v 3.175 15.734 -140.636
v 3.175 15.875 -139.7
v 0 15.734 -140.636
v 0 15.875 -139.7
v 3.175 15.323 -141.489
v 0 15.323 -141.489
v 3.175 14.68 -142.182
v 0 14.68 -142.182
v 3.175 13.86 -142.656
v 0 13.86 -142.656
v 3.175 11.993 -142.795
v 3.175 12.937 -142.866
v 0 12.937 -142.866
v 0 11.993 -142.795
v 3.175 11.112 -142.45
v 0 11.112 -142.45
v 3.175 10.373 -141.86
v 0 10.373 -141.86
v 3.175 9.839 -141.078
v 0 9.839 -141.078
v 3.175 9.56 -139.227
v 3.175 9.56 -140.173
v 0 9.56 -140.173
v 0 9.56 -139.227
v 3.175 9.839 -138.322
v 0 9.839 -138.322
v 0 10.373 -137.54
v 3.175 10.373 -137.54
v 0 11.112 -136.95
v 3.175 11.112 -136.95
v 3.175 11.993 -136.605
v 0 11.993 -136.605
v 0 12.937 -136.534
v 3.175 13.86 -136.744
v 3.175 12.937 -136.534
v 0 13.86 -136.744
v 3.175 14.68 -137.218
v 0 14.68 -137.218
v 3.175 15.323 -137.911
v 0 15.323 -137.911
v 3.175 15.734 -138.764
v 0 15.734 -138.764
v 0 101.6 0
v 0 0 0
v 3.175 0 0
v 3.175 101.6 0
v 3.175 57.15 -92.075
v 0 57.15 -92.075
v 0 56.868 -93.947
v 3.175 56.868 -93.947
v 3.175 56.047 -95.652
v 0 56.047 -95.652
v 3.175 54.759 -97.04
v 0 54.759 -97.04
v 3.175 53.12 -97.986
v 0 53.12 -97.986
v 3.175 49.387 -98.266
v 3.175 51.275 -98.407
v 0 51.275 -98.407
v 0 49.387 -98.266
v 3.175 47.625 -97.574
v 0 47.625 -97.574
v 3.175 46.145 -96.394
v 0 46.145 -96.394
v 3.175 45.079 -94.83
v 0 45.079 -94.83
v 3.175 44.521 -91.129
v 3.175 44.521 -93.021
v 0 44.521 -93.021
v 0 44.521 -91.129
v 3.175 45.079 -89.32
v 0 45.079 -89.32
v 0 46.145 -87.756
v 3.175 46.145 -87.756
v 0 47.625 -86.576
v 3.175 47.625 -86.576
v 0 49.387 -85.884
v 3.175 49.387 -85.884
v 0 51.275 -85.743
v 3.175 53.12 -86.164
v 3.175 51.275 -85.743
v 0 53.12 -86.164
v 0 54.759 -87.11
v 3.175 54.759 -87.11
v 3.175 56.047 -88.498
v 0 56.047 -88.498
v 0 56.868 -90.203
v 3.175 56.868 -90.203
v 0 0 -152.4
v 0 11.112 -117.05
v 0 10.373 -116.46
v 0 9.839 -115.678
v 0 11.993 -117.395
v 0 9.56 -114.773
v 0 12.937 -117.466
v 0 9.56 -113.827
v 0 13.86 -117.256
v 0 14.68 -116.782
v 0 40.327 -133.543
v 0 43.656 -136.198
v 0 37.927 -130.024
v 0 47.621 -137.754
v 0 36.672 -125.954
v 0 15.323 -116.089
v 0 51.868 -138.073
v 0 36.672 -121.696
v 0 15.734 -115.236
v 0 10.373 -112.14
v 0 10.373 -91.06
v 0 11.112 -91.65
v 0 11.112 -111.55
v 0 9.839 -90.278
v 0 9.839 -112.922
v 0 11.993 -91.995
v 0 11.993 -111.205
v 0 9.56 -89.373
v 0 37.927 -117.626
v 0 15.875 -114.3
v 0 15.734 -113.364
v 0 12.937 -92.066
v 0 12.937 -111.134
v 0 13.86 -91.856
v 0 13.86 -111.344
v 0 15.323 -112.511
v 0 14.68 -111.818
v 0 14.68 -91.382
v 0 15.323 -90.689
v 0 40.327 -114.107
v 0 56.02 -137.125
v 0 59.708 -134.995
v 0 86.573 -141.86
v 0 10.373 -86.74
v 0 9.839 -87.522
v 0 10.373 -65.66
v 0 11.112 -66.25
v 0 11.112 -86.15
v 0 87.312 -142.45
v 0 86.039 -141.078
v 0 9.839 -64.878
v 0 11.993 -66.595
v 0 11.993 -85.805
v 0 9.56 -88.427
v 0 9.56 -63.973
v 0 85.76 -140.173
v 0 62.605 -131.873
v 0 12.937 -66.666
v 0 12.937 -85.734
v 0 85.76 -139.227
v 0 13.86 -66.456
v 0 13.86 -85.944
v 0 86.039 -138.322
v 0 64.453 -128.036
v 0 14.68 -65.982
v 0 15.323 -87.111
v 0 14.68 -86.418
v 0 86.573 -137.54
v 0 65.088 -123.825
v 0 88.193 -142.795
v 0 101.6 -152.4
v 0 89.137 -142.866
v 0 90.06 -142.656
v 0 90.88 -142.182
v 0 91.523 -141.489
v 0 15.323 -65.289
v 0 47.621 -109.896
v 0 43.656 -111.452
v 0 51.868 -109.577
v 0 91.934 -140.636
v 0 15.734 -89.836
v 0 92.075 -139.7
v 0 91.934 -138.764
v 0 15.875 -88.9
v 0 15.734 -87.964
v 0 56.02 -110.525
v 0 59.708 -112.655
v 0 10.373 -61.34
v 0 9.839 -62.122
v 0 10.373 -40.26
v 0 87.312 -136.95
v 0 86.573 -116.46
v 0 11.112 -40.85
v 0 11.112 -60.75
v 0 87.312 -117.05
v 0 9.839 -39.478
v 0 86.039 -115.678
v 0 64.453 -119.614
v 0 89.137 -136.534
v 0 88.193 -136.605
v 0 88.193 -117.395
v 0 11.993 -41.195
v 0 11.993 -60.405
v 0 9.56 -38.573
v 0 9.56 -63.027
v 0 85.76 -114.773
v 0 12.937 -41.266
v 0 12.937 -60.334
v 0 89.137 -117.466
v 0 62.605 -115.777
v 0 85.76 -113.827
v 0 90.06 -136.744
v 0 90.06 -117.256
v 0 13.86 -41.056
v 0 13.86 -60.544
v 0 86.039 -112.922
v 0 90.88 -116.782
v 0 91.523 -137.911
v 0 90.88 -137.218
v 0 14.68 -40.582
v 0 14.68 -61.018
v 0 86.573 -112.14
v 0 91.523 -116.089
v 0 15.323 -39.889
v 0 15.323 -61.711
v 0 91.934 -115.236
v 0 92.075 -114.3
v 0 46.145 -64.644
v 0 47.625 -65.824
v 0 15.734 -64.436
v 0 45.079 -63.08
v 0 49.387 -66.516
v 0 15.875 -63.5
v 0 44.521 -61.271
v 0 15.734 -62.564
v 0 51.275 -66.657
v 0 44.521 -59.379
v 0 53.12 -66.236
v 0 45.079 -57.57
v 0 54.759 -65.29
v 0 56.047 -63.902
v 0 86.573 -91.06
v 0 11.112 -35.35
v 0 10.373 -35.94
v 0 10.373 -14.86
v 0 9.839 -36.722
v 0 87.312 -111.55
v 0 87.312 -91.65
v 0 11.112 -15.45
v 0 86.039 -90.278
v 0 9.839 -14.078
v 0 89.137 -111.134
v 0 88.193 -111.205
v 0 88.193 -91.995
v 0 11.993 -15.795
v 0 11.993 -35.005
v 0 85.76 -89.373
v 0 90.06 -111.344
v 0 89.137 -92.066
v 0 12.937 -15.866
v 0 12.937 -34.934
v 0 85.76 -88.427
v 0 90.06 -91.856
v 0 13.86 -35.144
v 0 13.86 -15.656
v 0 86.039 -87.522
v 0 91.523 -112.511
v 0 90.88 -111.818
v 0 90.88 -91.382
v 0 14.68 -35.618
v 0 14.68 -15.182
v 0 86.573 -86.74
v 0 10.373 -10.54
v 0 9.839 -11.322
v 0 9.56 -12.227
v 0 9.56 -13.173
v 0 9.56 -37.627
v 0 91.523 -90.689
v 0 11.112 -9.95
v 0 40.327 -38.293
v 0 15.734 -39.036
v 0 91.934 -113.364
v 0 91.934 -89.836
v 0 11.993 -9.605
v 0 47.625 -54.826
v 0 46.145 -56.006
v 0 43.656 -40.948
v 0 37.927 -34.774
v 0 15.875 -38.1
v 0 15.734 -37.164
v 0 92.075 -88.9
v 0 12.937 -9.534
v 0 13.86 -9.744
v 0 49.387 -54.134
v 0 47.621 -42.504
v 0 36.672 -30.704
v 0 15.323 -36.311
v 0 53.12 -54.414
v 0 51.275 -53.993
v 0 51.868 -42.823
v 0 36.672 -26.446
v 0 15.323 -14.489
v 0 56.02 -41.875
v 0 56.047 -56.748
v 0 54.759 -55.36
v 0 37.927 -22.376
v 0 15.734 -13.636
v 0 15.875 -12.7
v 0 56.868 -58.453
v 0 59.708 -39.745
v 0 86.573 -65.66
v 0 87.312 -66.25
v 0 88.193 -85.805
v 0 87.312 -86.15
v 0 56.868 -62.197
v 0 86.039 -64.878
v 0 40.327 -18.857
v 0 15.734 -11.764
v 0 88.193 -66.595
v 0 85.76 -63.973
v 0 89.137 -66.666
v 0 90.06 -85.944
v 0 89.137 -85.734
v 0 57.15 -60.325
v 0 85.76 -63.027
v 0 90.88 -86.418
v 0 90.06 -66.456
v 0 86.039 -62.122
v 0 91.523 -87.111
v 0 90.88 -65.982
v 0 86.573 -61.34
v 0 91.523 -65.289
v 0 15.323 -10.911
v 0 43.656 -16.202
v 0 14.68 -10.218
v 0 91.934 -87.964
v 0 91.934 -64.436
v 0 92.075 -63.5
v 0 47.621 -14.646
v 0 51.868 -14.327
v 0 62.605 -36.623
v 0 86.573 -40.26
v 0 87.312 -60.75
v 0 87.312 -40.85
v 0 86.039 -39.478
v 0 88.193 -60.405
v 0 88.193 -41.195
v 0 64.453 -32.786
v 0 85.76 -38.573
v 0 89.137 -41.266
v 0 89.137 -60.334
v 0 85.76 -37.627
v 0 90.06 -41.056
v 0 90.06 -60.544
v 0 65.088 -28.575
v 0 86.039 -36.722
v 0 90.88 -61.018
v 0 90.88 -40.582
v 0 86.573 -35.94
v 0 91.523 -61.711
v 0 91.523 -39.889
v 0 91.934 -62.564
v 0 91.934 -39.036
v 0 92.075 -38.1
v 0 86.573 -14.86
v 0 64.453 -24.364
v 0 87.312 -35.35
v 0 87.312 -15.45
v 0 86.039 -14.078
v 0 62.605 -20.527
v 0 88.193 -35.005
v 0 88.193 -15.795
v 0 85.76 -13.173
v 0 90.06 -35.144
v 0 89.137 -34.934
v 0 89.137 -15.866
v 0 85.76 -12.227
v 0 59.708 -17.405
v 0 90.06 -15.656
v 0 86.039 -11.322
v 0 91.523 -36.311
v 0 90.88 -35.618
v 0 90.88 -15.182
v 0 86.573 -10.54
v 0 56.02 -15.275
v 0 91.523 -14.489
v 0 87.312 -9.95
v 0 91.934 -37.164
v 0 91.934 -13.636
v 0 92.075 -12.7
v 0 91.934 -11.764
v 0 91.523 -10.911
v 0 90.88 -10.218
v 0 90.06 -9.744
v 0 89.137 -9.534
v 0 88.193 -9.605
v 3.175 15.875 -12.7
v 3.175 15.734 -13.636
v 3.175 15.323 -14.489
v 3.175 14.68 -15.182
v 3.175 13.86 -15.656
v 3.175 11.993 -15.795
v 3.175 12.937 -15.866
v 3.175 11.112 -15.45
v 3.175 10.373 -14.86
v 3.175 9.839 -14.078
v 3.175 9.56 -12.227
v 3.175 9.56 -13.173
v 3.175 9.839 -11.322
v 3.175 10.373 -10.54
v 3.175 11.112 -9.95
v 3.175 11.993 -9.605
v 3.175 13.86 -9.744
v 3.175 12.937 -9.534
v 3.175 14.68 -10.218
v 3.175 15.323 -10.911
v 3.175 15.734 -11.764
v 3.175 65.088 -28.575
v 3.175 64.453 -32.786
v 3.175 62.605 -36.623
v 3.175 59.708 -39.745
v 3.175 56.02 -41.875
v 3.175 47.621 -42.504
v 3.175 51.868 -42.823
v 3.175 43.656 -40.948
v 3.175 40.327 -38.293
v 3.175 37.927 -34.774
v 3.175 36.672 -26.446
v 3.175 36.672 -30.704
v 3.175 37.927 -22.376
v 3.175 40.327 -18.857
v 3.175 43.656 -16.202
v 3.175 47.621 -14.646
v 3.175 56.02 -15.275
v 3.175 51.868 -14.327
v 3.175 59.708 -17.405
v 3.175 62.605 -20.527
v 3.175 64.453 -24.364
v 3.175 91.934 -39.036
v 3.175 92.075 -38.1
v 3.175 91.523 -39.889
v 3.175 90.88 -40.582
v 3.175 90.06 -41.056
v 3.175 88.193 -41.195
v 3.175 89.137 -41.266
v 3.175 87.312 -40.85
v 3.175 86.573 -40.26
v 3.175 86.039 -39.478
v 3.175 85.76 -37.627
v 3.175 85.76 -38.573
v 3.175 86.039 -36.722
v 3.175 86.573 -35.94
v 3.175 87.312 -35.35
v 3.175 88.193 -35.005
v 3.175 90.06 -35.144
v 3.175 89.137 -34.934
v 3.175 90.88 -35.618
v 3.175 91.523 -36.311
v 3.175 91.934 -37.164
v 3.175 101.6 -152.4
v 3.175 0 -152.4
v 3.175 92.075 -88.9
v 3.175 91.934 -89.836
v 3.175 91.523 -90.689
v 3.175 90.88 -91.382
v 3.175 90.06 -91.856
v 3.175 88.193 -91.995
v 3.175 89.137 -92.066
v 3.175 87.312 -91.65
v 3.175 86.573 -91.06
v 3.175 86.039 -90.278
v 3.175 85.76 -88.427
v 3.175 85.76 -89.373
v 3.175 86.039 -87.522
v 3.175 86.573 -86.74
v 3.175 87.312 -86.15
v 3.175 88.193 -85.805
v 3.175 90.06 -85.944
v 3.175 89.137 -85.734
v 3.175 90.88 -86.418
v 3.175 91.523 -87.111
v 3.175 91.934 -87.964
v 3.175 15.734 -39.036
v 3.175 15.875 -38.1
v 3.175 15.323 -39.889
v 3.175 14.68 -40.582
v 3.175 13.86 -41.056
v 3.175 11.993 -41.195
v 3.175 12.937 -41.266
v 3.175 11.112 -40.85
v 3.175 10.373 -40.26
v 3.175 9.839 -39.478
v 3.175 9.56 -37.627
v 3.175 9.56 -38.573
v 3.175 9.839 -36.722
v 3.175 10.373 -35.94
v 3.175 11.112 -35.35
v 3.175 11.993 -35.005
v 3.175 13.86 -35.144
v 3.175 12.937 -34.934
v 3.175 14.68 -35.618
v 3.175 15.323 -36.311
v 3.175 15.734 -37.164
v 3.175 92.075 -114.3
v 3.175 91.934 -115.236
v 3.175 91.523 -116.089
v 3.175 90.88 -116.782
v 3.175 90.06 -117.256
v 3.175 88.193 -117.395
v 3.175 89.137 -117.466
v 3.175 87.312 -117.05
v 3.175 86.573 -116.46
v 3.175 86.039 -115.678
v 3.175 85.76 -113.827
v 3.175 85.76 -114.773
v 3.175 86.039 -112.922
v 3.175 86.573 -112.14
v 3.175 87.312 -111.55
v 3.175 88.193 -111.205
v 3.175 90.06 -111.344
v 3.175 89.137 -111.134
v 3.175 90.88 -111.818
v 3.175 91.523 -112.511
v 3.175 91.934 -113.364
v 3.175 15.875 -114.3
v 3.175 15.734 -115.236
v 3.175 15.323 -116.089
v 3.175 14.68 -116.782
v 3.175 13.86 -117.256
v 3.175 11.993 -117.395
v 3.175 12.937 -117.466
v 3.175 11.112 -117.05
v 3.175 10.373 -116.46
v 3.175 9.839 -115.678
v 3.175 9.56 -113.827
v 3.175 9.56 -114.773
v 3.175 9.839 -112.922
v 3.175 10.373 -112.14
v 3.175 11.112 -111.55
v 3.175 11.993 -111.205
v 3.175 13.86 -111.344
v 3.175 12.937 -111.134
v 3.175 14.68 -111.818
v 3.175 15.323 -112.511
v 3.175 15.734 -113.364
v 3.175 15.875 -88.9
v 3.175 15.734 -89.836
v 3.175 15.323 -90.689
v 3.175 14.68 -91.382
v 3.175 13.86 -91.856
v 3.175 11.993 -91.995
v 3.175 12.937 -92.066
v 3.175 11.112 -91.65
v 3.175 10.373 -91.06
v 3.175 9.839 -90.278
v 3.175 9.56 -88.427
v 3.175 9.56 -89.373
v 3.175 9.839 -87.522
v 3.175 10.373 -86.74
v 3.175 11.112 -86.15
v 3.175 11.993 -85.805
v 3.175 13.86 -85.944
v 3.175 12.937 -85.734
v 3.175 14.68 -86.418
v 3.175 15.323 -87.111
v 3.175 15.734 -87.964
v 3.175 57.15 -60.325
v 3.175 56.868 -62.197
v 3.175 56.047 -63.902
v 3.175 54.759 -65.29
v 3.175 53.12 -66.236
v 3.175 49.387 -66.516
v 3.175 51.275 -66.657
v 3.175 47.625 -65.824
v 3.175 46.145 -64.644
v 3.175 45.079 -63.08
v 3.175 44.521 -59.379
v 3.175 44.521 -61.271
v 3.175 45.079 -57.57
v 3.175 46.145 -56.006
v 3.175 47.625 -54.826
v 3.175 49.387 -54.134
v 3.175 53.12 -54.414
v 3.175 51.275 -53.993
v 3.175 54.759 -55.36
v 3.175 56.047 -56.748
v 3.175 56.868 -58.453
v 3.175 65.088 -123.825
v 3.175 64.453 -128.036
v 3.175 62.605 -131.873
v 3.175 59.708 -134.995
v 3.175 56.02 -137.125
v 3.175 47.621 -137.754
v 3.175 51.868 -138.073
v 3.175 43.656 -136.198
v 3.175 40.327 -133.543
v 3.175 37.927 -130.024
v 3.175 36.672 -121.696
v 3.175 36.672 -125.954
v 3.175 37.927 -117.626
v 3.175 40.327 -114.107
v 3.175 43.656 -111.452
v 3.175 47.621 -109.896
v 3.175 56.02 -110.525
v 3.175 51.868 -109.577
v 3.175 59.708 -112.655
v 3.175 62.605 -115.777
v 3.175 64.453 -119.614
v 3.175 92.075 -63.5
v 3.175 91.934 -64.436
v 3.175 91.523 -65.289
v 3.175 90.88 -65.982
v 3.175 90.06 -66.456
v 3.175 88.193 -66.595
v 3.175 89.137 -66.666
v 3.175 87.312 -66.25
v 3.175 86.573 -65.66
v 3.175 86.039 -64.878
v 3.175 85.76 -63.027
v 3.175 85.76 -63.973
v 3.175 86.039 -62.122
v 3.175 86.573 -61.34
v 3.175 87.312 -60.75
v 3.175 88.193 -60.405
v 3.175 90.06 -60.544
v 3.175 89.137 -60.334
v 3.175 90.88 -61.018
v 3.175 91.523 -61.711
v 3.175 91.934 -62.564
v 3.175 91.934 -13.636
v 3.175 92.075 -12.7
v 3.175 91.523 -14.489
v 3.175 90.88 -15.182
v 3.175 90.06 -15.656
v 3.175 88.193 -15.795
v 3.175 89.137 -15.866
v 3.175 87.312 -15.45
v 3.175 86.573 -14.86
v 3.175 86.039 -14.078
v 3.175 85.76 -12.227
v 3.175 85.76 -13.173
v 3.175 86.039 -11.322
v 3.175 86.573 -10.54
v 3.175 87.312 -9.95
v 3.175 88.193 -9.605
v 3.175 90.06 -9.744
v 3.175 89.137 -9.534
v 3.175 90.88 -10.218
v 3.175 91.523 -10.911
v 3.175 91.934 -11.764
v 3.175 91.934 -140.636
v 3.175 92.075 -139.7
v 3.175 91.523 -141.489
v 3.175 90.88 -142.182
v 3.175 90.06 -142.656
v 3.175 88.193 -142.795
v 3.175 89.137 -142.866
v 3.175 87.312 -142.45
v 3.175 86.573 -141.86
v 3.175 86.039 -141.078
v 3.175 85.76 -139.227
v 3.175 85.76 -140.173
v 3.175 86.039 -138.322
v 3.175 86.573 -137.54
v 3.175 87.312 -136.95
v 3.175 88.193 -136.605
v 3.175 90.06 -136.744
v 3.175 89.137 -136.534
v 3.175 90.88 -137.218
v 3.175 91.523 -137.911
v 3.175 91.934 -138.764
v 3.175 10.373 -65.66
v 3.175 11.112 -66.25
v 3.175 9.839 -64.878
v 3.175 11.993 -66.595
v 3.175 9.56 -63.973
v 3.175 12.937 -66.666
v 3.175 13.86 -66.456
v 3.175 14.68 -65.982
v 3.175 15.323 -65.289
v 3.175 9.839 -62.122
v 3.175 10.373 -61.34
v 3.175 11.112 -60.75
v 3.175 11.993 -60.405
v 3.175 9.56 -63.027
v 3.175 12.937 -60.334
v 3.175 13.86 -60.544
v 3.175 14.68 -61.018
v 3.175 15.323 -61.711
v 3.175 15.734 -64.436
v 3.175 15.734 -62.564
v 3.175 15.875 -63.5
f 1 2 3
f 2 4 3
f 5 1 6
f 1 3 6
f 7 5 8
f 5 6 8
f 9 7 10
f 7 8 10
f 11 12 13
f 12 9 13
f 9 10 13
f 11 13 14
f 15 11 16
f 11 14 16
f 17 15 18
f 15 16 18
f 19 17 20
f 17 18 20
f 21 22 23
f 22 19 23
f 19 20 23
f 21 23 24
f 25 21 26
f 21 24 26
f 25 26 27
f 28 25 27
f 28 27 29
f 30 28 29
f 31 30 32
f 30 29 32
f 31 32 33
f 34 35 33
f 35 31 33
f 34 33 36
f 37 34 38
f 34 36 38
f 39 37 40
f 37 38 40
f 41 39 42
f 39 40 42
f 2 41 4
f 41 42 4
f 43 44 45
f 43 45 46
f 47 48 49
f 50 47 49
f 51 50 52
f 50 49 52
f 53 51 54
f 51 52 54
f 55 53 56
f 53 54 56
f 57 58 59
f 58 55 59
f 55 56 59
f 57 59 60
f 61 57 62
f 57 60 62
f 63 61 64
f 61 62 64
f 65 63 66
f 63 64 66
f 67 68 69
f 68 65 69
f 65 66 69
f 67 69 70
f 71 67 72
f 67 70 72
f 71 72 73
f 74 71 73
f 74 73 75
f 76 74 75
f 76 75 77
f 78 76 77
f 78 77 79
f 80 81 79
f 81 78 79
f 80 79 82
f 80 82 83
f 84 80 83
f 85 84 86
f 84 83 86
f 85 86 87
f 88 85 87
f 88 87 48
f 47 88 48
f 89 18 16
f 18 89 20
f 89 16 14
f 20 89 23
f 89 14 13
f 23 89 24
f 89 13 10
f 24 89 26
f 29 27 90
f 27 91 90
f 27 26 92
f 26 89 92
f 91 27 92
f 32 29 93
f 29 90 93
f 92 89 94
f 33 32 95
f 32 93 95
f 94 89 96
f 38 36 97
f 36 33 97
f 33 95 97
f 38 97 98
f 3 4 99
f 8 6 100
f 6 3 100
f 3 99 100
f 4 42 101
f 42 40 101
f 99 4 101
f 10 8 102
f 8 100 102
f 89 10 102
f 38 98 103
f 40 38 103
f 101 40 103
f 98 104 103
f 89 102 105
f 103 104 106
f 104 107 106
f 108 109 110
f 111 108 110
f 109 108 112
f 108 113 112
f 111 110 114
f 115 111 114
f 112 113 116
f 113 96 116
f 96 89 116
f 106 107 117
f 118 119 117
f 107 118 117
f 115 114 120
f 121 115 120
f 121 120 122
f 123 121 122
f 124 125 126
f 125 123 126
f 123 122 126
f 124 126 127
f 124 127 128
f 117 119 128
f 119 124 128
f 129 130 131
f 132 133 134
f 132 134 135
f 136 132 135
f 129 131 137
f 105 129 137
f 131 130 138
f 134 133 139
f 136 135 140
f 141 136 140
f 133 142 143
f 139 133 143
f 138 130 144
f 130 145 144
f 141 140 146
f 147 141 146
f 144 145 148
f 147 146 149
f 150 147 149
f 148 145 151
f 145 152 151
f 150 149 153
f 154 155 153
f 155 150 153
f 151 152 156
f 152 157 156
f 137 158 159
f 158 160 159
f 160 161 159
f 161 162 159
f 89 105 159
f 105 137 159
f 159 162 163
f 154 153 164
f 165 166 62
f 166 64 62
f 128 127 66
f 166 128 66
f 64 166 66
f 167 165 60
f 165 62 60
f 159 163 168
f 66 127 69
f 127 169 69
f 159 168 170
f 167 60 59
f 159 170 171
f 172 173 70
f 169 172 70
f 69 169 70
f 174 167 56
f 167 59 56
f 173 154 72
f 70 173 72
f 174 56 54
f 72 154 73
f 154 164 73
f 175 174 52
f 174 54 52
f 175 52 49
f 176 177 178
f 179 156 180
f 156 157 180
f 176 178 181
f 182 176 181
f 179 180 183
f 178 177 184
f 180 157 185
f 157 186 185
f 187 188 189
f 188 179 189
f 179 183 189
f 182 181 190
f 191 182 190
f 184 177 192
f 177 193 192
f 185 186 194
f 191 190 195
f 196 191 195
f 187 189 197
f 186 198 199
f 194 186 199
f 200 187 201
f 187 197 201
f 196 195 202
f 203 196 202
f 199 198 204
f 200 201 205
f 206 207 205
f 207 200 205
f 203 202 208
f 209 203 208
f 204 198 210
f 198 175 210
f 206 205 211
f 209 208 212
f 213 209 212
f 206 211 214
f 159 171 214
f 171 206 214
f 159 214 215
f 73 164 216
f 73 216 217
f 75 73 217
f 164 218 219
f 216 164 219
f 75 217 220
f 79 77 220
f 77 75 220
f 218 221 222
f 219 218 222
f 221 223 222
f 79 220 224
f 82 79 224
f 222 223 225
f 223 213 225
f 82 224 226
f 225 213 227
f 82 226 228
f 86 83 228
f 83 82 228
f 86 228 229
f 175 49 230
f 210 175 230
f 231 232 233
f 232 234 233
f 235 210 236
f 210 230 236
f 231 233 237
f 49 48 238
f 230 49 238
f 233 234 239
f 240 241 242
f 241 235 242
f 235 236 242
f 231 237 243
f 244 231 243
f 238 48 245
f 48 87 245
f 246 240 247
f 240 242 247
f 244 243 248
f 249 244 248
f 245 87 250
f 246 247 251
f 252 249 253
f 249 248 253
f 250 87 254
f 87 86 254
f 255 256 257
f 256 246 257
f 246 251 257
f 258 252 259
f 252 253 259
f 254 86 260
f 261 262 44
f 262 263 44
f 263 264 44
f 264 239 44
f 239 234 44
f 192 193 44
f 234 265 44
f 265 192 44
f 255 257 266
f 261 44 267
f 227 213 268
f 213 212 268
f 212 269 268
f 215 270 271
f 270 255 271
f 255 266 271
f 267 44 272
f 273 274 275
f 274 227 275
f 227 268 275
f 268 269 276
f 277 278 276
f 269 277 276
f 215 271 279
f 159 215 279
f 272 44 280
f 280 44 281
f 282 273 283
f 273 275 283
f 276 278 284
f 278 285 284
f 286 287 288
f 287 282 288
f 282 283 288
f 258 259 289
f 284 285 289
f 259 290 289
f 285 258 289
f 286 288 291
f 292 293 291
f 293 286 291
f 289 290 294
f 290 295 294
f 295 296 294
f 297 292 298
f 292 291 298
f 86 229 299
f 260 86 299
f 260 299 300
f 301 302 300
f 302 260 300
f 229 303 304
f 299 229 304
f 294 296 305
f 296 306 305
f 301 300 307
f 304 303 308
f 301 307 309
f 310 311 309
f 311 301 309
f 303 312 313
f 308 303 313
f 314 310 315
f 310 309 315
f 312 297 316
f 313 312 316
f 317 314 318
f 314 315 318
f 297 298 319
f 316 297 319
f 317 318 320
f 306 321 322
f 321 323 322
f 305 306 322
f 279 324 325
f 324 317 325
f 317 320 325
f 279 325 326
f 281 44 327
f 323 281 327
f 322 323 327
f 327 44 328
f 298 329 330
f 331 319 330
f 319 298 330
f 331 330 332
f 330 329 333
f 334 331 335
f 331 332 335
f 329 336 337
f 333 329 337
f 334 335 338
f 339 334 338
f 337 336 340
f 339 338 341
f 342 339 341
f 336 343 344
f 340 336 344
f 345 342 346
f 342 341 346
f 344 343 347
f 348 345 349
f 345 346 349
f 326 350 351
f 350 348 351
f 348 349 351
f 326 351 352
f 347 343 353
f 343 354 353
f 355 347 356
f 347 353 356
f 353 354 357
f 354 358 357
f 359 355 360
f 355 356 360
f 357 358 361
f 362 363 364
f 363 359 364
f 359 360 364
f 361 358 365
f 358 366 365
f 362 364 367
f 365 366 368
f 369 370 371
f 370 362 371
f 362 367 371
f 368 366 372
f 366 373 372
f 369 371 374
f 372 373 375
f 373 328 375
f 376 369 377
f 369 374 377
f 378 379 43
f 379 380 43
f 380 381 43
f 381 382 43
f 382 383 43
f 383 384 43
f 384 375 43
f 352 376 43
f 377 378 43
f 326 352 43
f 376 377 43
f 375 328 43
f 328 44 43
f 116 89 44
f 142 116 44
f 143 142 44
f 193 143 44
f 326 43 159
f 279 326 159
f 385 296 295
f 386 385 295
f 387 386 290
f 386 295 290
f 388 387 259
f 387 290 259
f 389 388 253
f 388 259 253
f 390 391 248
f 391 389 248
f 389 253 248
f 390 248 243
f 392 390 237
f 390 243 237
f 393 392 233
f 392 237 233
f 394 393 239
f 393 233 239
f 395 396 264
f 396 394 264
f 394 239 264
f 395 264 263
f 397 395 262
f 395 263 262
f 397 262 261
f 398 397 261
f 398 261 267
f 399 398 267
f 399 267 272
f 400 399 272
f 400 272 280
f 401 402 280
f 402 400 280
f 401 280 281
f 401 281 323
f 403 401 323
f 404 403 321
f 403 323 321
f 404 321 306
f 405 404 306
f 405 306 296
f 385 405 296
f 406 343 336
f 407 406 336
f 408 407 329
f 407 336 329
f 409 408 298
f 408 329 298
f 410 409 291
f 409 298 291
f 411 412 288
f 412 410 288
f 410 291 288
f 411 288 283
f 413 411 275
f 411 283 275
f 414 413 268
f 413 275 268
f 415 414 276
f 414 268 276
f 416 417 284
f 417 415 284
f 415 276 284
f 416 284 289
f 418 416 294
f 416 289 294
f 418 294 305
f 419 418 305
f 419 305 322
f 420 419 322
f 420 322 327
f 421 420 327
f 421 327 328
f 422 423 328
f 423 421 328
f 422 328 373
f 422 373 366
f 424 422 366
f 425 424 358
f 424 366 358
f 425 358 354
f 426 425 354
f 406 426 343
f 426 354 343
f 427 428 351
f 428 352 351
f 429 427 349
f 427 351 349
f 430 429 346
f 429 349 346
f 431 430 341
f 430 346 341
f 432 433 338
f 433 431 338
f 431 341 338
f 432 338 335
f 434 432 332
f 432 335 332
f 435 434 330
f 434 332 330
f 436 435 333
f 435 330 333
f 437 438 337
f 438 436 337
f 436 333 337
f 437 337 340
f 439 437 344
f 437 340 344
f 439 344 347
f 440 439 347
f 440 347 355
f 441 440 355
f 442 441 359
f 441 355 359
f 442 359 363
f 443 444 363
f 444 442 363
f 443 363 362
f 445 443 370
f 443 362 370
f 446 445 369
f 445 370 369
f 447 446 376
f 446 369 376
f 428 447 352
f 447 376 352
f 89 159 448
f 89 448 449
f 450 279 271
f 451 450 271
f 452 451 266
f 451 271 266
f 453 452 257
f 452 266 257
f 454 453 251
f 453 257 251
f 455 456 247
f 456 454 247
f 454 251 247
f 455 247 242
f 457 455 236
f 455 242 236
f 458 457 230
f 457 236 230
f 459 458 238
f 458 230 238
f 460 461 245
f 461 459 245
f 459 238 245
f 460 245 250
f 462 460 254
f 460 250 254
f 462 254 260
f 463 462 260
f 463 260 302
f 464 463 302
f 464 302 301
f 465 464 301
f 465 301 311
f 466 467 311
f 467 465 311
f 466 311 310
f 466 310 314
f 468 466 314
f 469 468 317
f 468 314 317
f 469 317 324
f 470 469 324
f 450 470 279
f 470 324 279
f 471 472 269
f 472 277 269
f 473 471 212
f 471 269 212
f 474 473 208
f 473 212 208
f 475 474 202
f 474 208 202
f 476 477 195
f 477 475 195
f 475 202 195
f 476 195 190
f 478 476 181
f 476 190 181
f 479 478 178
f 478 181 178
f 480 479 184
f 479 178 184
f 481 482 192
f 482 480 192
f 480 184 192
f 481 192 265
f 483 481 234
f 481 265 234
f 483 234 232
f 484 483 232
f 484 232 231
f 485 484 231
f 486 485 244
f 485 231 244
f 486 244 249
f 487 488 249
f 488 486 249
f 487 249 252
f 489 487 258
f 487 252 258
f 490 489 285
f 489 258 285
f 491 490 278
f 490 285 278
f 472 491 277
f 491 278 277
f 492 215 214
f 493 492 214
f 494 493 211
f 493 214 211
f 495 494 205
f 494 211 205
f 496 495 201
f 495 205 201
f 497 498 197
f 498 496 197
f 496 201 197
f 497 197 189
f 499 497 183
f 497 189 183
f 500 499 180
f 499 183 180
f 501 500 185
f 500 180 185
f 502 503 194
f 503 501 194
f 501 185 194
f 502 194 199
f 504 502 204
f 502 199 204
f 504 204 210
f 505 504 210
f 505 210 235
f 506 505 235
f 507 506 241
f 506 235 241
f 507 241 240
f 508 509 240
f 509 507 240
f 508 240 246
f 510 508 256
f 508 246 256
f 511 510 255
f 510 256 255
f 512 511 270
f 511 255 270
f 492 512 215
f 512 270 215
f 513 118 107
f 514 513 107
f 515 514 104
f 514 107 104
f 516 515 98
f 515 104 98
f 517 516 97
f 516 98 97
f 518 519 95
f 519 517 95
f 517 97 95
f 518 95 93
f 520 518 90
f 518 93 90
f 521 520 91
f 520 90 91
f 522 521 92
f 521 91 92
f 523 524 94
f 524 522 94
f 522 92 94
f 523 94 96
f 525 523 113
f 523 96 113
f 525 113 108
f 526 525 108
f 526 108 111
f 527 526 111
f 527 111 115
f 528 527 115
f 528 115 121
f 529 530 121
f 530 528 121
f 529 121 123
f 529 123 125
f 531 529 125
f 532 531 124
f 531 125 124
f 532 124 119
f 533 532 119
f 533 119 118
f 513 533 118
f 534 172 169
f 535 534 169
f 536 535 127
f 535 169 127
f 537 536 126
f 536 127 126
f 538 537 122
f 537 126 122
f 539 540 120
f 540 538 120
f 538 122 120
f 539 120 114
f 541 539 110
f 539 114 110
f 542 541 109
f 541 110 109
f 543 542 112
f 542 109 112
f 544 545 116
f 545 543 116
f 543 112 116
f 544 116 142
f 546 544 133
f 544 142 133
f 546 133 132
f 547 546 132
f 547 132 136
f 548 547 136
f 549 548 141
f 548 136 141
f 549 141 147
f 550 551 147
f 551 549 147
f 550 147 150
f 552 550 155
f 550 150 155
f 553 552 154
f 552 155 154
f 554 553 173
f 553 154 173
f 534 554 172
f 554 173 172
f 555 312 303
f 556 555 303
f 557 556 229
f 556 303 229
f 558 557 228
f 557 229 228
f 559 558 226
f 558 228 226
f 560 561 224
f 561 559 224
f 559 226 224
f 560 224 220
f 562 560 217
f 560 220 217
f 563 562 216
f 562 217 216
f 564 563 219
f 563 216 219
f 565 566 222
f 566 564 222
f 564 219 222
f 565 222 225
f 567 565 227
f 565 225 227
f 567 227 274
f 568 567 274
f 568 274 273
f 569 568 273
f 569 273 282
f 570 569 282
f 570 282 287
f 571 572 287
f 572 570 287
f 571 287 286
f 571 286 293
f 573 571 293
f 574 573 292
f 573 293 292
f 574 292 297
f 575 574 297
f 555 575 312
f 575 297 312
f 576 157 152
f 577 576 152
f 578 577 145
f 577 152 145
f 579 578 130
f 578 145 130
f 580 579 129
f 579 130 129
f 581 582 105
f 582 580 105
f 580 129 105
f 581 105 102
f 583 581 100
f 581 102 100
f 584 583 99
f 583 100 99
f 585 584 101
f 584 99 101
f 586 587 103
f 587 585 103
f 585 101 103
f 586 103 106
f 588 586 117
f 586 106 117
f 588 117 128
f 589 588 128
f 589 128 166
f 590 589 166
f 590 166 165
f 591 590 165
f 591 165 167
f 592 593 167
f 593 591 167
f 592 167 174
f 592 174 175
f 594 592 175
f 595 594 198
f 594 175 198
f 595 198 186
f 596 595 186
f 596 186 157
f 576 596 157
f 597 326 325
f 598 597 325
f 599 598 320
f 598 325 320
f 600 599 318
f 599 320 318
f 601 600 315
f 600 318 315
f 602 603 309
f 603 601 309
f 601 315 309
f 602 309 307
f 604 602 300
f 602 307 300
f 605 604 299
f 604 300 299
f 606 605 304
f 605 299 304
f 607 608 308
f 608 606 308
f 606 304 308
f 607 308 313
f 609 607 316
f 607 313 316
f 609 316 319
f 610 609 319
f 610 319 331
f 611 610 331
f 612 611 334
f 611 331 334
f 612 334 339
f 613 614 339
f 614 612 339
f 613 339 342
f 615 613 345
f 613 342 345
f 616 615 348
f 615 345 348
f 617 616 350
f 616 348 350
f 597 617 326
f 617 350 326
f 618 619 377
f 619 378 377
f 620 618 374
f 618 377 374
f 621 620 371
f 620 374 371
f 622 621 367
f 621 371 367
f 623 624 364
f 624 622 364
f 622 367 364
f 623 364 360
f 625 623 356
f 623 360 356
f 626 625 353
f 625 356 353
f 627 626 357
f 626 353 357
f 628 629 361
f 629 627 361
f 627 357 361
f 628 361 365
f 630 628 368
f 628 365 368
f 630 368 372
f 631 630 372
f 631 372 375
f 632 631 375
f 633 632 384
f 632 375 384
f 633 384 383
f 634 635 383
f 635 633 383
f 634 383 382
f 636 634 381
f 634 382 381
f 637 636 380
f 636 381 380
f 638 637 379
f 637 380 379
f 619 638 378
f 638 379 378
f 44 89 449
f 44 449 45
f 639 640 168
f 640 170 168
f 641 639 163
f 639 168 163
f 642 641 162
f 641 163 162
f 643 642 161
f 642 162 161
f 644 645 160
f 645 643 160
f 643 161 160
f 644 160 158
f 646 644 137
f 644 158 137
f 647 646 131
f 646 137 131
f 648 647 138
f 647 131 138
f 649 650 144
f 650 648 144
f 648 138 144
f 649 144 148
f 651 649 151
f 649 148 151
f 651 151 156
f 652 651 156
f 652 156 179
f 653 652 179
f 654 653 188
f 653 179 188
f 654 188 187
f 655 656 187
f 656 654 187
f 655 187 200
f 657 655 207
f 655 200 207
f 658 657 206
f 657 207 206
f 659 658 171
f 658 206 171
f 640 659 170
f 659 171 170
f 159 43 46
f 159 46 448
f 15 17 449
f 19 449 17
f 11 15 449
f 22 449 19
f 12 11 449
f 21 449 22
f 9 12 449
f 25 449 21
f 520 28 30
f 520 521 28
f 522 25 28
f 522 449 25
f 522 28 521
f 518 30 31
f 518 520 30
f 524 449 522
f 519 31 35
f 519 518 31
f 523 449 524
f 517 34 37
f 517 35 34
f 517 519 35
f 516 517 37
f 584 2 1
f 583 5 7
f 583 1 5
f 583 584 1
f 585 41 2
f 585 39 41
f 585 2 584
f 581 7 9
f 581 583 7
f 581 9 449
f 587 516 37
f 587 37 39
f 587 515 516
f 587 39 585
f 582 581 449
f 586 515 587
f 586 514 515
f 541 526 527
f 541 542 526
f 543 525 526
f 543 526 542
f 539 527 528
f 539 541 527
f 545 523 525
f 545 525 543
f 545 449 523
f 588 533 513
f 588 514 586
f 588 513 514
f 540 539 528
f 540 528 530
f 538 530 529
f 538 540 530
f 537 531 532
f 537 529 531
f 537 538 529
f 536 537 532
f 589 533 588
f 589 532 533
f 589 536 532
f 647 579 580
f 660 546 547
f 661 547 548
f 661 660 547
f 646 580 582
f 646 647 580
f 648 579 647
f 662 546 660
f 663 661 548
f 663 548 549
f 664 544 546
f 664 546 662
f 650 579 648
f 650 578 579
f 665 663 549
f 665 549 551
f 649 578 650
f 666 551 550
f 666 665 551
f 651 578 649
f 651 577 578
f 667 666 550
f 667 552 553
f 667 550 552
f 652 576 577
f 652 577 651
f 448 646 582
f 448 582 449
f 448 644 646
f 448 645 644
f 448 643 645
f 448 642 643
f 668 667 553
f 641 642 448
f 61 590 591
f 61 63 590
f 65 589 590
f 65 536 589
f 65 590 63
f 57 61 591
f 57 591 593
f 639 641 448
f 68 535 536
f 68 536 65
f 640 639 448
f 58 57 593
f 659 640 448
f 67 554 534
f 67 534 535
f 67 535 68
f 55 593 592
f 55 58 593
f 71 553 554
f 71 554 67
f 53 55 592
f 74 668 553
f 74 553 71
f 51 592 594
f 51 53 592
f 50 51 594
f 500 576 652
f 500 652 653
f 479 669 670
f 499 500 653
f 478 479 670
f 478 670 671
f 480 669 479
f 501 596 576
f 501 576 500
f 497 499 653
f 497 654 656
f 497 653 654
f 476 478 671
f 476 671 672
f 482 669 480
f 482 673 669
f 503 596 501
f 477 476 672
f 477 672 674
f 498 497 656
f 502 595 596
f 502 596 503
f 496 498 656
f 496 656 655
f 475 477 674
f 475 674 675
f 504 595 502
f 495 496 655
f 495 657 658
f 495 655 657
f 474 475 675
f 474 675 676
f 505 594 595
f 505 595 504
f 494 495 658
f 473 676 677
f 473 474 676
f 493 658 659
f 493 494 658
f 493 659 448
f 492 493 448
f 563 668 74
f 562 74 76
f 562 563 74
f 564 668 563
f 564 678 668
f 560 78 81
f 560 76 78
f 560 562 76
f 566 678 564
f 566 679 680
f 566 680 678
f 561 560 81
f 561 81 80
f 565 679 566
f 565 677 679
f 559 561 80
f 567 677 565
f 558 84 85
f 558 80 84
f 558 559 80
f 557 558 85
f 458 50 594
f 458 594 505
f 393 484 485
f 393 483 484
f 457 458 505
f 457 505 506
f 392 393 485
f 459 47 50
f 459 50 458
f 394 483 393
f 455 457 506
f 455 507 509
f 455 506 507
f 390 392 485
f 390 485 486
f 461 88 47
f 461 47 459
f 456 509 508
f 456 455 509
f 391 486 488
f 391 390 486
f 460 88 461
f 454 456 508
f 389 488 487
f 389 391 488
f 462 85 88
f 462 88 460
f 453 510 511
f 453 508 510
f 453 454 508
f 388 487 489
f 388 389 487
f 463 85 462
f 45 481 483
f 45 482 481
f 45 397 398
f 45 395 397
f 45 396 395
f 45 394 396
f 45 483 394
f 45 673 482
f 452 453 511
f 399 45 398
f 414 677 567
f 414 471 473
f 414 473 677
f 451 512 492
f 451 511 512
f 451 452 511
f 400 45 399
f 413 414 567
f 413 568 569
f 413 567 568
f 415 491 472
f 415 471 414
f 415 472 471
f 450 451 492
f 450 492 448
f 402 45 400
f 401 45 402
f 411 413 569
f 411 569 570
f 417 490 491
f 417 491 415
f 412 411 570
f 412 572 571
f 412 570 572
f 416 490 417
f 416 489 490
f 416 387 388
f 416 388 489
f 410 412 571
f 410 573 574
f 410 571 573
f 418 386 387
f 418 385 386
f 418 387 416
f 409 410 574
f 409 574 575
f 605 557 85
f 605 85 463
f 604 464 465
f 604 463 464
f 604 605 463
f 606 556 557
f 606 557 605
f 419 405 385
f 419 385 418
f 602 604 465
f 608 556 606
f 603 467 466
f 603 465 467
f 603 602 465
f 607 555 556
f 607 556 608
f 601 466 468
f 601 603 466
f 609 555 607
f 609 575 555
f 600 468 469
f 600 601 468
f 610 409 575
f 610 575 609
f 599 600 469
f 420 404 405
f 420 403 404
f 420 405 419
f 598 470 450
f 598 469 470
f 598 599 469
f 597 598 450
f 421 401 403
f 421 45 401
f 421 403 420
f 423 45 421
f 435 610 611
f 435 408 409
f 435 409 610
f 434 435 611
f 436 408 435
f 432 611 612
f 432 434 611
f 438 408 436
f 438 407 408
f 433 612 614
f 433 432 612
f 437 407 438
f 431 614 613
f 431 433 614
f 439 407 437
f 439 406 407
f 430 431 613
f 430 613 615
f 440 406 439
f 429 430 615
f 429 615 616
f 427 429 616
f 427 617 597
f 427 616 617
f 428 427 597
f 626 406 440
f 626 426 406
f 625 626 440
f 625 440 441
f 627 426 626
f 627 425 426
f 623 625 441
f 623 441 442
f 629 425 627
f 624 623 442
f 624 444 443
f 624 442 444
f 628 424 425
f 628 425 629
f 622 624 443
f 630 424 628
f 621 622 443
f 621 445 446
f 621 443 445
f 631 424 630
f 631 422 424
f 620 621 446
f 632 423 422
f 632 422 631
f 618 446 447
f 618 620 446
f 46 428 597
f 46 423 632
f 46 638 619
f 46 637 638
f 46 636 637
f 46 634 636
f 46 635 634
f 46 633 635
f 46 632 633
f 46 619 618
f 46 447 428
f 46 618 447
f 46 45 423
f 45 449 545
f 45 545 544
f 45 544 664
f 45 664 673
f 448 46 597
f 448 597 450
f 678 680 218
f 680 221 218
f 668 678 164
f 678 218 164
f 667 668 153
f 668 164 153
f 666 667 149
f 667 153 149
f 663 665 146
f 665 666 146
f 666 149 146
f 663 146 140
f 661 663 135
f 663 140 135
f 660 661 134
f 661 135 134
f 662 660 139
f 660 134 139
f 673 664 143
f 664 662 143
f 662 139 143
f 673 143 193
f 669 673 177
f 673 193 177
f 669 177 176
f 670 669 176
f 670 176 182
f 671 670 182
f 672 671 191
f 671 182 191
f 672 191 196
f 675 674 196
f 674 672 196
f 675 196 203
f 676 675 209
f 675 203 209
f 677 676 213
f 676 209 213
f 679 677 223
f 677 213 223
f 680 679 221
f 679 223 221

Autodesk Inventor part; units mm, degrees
ref_plane "YZ Plane" through (0, 0, 0) normal (1, 0, 0) x (0, 1, 0)
ref_plane "XZ Plane" through (0, 0, 0) normal (0, 1, 0) x (-1, 0, 0)
ref_plane "XY Plane" through (0, 0, 0) normal (0, 0, 1) x (1, 0, 0)
sketch "Sketch1" plane through (0, 0, 0) normal (1, 0, 0) x (0, 1, 0)
  line L0 (0, 0) -> (101.6, 0)
  line L1 (101.6, 0) -> (101.6, -152.4)
  line L2 (101.6, -152.4) -> (0, -152.4)
  line L3 (0, -152.4) -> (0, 0)
  circle A0 centre (50.8, -28.575) radius 14.2875
  circle A1 centre (50.8, -60.325) radius 6.35
  circle A2 centre (50.8, -92.075) radius 6.35
  circle A3 centre (50.8, -123.825) radius 14.2875
  line L4 (50.8, -28.575) -> (50.8, -123.825) construction
  circle A4 centre (88.9, -12.7) radius 3.175
  circle A5 centre (88.9, -38.1) radius 3.175
  circle A6 centre (88.9, -63.5) radius 3.175
  circle A7 centre (88.9, -88.9) radius 3.175
  circle A8 centre (88.9, -114.3) radius 3.175
  circle A9 centre (88.9, -139.7) radius 3.175
  circle A10 centre (12.7, -12.7) radius 3.175
  circle A11 centre (12.7, -38.1) radius 3.175
  circle A12 centre (12.7, -63.5) radius 3.175
  circle A13 centre (12.7, -88.9) radius 3.175
  circle A14 centre (12.7, -114.3) radius 3.175
  circle A15 centre (12.7, -139.7) radius 3.175
  point P0 (101.6, -76.2)
  point P1 (50.8, -76.2)
  point P2 (50.8, -152.4)
  dimension "d0" = 101.6
  dimension "d1" = 152.4
  dimension "d2" = 28.575
  dimension "d3" = 12.7
  dimension "d4" = 12.7
  dimension "d5" = 28.575
  dimension "d6" = 31.75
  dimension "d7" = 31.75
  dimension "d8" = 31.75
  dimension "d9" = 6.35
  dimension "d10" = 12.7
  dimension "d11" = 12.7
  dimension "d14" = 25.4
  dimension "d17" = 76.2
extrude "Extrusion1" add sketch "Sketch1" along normal blind 3.175
equation "\"d7\" = d6"
equation "\"d8\" = d7"
properties part number "CH-1-02-RearGearboxHousingMotorSide"
